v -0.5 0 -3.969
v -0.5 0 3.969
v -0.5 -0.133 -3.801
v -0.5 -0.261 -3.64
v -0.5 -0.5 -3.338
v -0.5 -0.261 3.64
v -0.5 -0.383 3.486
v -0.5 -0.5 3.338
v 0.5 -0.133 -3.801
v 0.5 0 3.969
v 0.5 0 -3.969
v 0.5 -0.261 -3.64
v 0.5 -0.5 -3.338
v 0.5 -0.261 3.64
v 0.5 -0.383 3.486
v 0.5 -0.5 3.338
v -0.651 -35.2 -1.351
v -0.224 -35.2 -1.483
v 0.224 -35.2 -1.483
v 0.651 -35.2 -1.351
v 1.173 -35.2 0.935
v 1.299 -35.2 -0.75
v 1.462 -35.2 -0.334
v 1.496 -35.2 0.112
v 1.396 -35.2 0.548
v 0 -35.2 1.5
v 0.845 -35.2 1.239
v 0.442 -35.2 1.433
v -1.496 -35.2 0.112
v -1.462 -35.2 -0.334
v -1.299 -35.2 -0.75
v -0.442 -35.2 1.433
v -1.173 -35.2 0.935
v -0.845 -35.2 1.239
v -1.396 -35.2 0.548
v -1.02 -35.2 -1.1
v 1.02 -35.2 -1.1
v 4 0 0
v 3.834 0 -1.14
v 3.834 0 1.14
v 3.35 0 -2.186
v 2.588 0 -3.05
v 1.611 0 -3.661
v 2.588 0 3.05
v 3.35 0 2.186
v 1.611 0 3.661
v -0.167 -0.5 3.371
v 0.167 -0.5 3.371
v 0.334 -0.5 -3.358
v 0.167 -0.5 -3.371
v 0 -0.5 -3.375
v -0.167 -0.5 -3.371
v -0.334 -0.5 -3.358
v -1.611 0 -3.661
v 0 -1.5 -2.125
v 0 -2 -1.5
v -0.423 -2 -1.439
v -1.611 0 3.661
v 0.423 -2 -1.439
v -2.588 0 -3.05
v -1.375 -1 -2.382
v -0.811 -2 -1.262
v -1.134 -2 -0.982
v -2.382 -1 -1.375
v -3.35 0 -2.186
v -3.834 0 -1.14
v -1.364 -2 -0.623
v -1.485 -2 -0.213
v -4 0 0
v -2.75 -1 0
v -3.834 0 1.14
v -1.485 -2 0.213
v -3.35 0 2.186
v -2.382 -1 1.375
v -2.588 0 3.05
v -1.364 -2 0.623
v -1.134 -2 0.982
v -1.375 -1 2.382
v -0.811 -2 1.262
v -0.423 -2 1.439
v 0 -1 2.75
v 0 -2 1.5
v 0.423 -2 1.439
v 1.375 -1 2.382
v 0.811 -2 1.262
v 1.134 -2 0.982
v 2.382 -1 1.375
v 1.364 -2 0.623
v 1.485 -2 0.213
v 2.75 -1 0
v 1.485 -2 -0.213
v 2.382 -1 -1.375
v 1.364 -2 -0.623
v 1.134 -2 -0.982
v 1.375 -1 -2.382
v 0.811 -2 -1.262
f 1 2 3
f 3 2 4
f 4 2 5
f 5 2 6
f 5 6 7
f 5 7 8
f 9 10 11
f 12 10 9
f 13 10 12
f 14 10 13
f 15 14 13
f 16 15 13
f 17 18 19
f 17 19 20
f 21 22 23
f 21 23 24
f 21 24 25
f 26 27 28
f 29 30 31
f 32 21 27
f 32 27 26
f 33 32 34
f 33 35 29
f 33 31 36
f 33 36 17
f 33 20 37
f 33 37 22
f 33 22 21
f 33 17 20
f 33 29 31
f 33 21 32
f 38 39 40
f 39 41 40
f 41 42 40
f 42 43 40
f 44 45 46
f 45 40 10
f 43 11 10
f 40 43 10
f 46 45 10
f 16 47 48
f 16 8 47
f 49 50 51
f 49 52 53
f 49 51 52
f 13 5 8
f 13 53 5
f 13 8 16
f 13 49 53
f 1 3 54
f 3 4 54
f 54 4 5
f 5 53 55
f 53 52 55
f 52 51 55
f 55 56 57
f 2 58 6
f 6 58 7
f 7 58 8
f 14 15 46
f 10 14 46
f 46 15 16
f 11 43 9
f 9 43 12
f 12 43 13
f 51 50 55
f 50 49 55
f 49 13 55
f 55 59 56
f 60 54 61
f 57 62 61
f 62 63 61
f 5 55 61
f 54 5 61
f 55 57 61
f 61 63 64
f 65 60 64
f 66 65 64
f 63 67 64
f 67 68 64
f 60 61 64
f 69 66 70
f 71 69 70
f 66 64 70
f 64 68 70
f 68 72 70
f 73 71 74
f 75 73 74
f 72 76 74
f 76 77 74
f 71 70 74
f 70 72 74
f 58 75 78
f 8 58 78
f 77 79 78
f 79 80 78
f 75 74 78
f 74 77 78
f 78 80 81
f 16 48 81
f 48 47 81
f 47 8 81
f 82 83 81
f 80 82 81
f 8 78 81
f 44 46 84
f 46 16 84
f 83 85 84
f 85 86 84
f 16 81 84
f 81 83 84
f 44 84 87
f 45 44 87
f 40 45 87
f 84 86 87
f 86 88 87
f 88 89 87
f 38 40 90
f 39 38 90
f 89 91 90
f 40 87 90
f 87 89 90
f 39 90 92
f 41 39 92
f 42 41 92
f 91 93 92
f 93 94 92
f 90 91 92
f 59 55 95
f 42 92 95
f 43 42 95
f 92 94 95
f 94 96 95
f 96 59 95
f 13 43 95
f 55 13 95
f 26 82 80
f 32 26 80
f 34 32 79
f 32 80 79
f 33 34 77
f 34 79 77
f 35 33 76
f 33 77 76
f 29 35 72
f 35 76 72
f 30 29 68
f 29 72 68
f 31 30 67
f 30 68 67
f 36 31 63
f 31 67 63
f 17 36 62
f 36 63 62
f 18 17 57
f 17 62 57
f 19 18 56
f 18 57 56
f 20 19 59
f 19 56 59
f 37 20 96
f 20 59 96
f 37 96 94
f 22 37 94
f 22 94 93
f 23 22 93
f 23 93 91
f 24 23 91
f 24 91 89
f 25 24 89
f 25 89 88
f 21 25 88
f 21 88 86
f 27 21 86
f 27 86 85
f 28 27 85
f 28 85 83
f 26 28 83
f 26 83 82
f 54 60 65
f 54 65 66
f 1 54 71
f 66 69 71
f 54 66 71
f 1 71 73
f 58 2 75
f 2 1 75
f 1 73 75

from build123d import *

# Parameters (mm, degrees)
SKETCH7_W           = 1
SKETCH7_H           = 8.308245604
CUT_EXTRUDE3_DEPTH  = 0.5
SKETCH8_R           = 1.5
BOSS_EXTRUDE3_DEPTH = 33.2


with BuildPart() as part:
    # Sketch6 → Revolve1 (revolve)
    with BuildSketch(Plane.XY, mode=Mode.PRIVATE) as revolve1_sk:
        Polygon((0, 0), (4, 0), (1.5, -2), (0, -2), align=None)
    revolve(revolve1_sk.sketch.rotate(Axis((0, 0, 0), (0, 1, 0)), 90), axis=Axis((0, 0, 0), (0, 1, 0)))

    # Sketch7 → Cut-Extrude3 (cut)
    with BuildSketch(Plane(origin=(0, 0, 0), x_dir=(1, 0, 0), z_dir=(0, 1, 0))):
        Rectangle(SKETCH7_W, SKETCH7_H)
    extrude(amount=-CUT_EXTRUDE3_DEPTH, mode=Mode.SUBTRACT)

    # Sketch8 → Boss-Extrude3 (add)
    with BuildSketch(Plane.XZ.offset(2)):
        with Locations(Location((0, 0, 0), (0, 0, 90))):
            Circle(SKETCH8_R)
    extrude(amount=BOSS_EXTRUDE3_DEPTH)


solid = part.part
